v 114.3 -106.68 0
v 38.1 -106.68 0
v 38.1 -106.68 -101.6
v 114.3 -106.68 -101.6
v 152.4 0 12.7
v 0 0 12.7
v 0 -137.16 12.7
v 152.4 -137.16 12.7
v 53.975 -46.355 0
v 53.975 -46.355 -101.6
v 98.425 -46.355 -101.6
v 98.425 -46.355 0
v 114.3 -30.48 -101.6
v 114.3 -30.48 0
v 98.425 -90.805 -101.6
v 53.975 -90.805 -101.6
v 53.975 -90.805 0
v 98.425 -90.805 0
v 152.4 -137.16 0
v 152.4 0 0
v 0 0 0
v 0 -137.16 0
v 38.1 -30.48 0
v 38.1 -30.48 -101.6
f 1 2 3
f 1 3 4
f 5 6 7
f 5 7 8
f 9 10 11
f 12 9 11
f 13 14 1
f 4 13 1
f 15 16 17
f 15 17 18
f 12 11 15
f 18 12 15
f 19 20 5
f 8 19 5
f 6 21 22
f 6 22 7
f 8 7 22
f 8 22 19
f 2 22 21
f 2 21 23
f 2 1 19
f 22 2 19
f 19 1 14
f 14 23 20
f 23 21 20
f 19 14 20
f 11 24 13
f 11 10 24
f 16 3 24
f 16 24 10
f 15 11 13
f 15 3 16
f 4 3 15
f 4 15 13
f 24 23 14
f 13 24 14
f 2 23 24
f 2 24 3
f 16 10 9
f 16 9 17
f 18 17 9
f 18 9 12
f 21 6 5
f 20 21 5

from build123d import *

# Parameters (mm, degrees)
F0_W     = 152.4
F0_H     = 12.7
F1_DEPTH = 137.16
F2_W     = 76.2
F2_H     = 76.2
F3_DEPTH = 101.6
F4_W     = 44.45
F4_H     = 44.45
F5_DEPTH = 101.6


with BuildPart() as f1:
    # F0 (on Front) → F1 (new body)
    with BuildSketch(Plane.XZ):
        with Locations((76.2, 6.35)):
            Rectangle(F0_W, F0_H)
    extrude(amount=F1_DEPTH)

    # F2 (on face) → F3 (join)
    with BuildSketch(Plane(origin=(0, 0, 0), x_dir=(1, 0, 0), z_dir=(0, 0, -1))):
        with Locations((76.2, 68.58)):
            Rectangle(F2_W, F2_H)
    extrude(amount=F3_DEPTH)

    # F4 (on face) → F5 (cut)
    with BuildSketch(Plane(origin=(0, 0, -101.6), x_dir=(1, 0, 0), z_dir=(0, 0, -1))):
        with Locations((76.2, 68.58)):
            Rectangle(F4_W, F4_H)
    extrude(amount=-F5_DEPTH, mode=Mode.SUBTRACT)


solid = f1.part
